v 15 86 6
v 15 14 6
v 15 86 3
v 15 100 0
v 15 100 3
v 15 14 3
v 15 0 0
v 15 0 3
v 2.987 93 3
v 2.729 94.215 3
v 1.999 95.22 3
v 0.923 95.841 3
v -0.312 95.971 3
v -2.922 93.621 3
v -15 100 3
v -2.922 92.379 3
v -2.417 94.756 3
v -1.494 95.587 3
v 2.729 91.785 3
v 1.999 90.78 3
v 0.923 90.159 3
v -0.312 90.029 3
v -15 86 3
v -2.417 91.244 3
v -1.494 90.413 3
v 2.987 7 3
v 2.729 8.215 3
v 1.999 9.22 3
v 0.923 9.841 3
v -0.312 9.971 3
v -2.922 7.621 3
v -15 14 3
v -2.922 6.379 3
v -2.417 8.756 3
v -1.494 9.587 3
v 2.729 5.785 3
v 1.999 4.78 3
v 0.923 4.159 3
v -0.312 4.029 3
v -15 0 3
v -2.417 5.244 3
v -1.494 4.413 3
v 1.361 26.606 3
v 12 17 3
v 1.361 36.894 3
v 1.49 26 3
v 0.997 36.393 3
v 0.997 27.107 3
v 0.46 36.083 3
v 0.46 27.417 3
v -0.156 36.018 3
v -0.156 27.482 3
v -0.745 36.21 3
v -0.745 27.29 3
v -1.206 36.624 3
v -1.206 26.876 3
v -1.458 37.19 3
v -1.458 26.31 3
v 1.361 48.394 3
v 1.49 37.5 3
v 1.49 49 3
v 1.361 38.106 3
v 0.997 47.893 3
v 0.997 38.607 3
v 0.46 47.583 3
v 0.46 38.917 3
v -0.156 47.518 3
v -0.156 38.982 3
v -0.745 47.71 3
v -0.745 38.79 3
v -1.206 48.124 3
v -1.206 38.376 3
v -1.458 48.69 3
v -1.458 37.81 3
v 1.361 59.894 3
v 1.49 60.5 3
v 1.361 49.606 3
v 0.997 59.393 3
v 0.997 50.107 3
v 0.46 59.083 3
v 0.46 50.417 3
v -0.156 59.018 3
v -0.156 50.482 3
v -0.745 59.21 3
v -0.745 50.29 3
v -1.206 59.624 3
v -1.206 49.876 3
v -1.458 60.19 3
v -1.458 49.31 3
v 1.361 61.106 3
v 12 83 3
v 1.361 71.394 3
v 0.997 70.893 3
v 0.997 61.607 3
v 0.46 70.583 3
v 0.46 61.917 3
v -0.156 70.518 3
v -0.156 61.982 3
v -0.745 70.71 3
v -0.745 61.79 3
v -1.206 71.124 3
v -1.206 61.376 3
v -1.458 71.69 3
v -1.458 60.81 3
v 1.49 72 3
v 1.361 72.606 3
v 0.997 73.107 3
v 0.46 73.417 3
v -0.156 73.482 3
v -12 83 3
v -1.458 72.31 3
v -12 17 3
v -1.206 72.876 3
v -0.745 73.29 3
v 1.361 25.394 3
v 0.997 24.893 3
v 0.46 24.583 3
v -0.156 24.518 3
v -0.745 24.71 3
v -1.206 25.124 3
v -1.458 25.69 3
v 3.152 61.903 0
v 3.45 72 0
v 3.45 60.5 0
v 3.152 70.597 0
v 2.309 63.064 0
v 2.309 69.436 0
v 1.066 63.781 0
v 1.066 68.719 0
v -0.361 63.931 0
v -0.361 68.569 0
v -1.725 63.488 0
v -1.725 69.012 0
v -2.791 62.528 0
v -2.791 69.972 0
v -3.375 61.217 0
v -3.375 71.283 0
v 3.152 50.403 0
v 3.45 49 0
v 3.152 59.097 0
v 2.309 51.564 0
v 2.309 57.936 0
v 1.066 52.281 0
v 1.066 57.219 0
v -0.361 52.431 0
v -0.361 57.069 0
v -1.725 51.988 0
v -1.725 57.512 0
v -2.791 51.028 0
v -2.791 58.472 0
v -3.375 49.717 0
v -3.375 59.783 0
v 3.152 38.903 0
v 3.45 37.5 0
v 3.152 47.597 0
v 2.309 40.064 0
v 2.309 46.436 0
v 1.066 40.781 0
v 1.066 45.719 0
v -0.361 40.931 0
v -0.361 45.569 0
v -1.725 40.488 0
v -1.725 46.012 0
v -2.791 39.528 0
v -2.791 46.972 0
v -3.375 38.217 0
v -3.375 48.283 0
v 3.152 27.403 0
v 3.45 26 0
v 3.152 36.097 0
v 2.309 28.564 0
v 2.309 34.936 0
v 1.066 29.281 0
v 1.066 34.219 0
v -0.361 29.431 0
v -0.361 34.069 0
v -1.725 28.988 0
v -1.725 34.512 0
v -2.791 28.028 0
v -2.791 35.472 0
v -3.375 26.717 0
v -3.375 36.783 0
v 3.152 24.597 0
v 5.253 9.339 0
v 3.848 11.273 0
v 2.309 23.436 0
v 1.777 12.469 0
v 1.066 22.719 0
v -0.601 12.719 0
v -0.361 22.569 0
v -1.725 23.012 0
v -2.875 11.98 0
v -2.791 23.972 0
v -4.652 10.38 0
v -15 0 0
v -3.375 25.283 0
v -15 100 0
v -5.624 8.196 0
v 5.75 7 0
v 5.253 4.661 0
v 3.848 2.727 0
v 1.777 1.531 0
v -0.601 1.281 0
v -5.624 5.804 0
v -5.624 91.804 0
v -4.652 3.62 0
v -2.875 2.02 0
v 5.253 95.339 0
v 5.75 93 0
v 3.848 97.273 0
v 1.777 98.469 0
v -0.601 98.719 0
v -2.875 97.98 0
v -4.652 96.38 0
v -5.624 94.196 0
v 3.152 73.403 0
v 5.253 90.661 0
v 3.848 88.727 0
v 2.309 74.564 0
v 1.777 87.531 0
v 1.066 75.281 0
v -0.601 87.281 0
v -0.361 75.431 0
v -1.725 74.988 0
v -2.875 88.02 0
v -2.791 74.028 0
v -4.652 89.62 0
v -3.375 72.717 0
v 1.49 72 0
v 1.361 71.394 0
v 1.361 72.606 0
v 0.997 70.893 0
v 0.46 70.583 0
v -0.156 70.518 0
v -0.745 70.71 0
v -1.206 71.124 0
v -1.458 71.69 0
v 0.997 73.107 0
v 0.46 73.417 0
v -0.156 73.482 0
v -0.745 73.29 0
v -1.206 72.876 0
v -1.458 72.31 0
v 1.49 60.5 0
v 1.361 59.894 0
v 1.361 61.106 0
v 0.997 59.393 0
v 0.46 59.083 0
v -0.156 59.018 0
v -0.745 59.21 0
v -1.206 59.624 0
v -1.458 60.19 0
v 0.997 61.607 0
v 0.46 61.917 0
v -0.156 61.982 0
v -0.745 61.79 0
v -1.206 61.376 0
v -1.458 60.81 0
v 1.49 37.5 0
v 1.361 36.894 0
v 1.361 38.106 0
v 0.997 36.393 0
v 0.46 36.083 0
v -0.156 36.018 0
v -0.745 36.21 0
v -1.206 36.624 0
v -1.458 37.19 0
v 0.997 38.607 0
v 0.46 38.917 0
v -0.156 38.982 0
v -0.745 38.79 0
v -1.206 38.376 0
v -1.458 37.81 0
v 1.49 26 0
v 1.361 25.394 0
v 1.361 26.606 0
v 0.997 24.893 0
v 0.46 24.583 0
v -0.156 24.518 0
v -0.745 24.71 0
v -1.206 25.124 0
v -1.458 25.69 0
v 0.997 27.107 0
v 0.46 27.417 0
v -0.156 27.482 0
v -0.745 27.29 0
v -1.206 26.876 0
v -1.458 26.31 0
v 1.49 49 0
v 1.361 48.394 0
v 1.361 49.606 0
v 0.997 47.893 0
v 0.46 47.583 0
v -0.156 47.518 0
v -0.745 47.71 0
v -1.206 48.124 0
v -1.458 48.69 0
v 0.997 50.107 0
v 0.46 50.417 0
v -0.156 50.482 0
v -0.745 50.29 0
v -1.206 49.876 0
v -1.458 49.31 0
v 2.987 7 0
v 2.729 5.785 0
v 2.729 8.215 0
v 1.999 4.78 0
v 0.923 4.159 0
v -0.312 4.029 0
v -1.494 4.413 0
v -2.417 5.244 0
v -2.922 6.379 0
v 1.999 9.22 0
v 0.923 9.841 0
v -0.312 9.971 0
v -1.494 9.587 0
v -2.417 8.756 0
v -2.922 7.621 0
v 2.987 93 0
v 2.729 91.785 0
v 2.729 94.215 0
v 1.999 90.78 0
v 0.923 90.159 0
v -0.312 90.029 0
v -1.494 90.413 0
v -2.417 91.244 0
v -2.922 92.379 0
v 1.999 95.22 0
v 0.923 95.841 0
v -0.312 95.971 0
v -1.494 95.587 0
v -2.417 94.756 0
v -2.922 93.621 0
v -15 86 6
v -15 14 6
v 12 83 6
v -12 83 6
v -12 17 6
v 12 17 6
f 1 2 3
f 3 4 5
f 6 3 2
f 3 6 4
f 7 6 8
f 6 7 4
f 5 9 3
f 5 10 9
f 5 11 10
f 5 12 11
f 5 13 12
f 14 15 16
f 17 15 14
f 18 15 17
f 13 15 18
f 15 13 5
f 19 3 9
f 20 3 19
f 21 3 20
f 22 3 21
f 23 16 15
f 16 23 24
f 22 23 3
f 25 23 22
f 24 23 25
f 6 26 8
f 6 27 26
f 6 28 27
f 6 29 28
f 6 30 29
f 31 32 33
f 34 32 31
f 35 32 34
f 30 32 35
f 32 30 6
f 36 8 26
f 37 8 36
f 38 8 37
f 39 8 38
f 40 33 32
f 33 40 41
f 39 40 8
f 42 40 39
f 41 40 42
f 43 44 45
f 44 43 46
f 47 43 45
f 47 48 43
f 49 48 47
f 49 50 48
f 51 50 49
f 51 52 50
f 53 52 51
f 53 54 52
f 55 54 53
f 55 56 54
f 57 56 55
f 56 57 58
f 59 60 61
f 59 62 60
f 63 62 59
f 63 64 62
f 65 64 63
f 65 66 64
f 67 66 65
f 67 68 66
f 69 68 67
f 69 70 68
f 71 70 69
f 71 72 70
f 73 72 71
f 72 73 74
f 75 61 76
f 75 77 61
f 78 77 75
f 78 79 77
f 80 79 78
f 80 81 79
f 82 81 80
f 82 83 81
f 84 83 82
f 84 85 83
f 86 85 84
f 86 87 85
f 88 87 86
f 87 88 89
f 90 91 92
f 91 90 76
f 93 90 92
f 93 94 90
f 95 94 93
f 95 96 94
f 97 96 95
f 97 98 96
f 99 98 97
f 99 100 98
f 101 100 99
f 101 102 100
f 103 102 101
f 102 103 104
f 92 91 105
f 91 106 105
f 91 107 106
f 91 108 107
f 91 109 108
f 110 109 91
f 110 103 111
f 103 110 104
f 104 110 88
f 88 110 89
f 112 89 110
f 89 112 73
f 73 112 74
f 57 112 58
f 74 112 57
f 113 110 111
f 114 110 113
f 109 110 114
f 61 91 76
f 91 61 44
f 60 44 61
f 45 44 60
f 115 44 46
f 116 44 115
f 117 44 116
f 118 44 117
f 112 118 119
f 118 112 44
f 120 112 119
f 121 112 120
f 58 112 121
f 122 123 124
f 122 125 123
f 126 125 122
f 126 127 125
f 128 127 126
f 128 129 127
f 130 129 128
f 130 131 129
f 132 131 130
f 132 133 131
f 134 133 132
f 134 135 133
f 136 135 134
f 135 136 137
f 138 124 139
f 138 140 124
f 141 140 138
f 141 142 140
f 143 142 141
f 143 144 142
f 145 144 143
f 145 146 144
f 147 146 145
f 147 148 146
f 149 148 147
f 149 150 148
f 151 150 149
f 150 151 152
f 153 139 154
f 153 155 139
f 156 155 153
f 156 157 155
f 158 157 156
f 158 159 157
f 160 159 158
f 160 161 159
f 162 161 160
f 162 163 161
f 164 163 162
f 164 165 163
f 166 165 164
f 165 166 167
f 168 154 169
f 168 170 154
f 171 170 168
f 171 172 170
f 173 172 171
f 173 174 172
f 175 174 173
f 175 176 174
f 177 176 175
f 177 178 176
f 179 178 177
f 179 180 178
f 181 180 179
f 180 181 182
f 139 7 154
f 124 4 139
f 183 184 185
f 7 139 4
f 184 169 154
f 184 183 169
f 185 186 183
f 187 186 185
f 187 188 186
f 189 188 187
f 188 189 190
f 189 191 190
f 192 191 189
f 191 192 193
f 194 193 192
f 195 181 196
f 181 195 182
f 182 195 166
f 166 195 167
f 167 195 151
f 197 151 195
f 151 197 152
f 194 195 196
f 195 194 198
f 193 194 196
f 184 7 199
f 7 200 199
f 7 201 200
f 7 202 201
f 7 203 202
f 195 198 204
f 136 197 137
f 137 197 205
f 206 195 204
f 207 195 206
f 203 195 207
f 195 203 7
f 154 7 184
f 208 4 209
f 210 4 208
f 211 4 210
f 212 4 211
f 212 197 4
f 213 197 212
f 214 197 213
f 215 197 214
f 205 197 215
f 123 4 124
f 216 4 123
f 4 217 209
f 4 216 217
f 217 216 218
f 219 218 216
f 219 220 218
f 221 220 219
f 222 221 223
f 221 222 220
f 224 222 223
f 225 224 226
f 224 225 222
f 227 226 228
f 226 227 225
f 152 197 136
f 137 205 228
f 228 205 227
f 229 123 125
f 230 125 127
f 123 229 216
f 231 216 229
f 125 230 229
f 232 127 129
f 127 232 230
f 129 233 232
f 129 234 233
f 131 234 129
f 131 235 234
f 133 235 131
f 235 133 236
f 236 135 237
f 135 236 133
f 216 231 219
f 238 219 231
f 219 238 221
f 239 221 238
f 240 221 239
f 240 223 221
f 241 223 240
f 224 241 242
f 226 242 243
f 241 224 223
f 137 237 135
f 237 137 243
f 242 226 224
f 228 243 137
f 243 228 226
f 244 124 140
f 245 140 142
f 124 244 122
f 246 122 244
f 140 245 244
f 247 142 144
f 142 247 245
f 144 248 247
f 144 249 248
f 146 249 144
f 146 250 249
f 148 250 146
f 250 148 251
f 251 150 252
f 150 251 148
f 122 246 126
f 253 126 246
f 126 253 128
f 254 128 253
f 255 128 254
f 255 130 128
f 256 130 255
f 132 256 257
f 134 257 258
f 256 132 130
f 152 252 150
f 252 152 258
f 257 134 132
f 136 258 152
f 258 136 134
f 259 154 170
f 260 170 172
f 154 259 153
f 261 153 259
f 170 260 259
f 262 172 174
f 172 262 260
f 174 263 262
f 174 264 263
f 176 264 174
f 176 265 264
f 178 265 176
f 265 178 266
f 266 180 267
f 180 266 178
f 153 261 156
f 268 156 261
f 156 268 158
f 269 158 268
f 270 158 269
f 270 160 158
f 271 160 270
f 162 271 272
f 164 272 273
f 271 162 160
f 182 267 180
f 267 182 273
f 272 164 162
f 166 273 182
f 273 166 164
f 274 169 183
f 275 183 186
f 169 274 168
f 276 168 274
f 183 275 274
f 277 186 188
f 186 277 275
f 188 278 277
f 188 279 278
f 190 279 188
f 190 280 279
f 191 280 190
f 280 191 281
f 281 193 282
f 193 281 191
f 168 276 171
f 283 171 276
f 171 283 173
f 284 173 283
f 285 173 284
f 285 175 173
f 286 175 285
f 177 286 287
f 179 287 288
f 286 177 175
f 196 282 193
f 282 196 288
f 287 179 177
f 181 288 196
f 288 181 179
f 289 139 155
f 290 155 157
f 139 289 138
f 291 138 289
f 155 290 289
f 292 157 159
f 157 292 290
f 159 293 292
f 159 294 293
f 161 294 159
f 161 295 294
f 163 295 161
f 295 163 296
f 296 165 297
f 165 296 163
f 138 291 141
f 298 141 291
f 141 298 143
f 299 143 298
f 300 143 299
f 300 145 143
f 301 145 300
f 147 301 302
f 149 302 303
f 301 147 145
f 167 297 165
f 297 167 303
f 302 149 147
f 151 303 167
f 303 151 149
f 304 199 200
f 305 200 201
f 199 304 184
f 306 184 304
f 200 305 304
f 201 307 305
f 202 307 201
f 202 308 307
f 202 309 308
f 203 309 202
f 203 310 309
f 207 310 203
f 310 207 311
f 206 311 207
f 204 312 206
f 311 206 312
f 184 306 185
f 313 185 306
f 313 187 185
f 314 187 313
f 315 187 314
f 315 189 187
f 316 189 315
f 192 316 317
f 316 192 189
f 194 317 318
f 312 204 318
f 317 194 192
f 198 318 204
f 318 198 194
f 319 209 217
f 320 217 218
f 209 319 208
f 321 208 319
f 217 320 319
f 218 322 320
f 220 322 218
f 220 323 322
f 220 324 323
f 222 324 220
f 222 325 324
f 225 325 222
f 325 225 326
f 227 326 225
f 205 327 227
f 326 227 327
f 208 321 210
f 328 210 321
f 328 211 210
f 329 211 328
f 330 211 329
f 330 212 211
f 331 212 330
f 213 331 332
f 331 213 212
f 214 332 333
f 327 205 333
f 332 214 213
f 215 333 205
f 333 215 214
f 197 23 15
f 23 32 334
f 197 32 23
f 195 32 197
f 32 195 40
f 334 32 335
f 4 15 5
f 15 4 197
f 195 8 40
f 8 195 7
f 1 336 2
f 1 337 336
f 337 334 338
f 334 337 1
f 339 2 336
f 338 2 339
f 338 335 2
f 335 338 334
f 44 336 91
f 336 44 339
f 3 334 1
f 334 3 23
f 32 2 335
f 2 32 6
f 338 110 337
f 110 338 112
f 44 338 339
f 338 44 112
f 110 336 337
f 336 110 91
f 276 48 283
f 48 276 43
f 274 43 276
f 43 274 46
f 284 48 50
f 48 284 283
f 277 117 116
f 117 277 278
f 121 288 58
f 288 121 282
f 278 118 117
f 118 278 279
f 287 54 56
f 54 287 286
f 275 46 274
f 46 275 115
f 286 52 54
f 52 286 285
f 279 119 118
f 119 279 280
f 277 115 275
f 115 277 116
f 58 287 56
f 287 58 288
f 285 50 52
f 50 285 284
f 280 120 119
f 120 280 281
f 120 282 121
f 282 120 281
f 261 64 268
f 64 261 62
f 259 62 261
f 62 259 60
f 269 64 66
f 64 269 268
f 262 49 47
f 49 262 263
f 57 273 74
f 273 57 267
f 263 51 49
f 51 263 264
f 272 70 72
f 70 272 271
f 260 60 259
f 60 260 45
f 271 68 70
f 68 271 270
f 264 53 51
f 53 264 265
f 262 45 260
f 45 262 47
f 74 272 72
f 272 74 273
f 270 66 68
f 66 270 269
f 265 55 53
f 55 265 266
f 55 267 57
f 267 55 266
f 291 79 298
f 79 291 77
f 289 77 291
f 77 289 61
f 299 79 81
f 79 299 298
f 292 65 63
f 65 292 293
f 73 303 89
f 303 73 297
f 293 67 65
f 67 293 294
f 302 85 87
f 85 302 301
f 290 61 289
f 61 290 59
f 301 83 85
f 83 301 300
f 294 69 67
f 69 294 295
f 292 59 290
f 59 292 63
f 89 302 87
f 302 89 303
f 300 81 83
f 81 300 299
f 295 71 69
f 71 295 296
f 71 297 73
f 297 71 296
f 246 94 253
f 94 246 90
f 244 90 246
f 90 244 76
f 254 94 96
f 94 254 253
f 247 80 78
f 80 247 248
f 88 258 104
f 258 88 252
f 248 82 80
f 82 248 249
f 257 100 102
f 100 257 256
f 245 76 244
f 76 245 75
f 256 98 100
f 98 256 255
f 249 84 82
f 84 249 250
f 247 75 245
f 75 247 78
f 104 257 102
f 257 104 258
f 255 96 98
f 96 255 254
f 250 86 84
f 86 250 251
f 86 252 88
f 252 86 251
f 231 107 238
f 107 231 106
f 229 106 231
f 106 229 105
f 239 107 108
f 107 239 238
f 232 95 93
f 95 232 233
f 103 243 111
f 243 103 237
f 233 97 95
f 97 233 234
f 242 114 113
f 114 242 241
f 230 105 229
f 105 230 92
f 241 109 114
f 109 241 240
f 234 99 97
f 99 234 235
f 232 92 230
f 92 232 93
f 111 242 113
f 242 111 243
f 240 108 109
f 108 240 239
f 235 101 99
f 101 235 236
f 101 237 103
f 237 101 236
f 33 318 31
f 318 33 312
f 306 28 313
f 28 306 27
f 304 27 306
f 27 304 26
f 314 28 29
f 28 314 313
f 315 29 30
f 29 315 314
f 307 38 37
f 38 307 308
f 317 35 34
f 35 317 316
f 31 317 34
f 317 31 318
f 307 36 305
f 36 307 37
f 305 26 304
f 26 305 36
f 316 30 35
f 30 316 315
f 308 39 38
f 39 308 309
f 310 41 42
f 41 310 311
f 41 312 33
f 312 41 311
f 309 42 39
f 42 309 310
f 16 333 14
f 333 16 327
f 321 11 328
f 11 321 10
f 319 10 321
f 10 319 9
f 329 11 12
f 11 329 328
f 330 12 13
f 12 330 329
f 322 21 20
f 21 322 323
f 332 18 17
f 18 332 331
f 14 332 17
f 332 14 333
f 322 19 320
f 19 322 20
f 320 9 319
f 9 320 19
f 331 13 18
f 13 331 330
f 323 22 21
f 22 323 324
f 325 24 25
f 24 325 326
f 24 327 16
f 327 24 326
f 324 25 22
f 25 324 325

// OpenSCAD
// file: nuts_and_bolts.scad
// Copyright 2010 D1plo1d

// This library is dual licensed under the GPL 3.0 and the GNU Lesser General Public License as per http://creativecommons.org/licenses/LGPL/2.1/ .

//testNutsAndBolts();

module SKIPtestNutsAndBolts()
{
	$fn = 360;
	translate([0,15])nutHole(3);
	boltHole(3, length= 30);
}

MM = "mm";
INCH = "inch"; //Not yet supported

//Based on: http://www.roymech.co.uk/Useful_Tables/Screws/Hex_Screws.htm
METRIC_NUT_AC_WIDTHS =
[
	-1, //0 index is not used but reduces computation
	-1,
	-1,
	6.90,//m3
	8.10,//m4
	9.20,//m5
	11.50,//m6
	-1,
	15.50,//m8
	-1,
	19.60,//m10
	-1,
	22.10,//m12
	-1,
	-1,
	-1,
	27.70,//m16
	-1,
	-1,
	-1,
	34.60,//m20
	-1,
	-1,
	-1,
	41.60,//m24
	-1,
	-1,
	-1,
	-1,
	-1,
	53.1,//m30
	-1,
	-1,
	-1,
	-1,
	-1,
	63.5//m36
];
METRIC_NUT_THICKNESS =
[
	-1, //0 index is not used but reduces computation
	-1,
	-1,
	2.40,//m3
	3.20,//m4
	4.00,//m5
	5.00,//m6
	-1,
	6.50,//m8
	-1,
	8.00,//m10
	-1,
	10.00,//m12
	-1,
	-1,
	-1,
	13.00,//m16
	-1,
	-1,
	-1,
	16.00//m20
	-1,
	-1,
	-1,
	19.00,//m24
	-1,
	-1,
	-1,
	-1,
	-1,
	24.00,//m30
	-1,
	-1,
	-1,
	-1,
	-1,
	29.00//m36
];

COURSE_METRIC_BOLT_MAJOR_THREAD_DIAMETERS =
[//based on max values
	-1, //0 index is not used but reduces computation
	-1,
	-1,
	2.98,//m3
	3.978,//m4
	4.976,//m5
	5.974,//m6
	-1,
	7.972,//m8
	-1,
	9.968,//m10
	-1,
	11.966,//m12
	-1,
	-1,
	-1,
	15.962,//m16
	-1,
	-1,
	-1,
	19.958,//m20
	-1,
	-1,
	-1,
	23.952,//m24
	-1,
	-1,
	-1,
	-1,
	-1,
	29.947,//m30
	-1,
	-1,
	-1,
	-1,
	-1,
	35.940//m36
];

module nutHole(size, units=MM, tolerance = +0.0001, proj = -1)
{
	//takes a metric screw/nut size and looksup nut dimensions
	radius = METRIC_NUT_AC_WIDTHS[size]/2+tolerance;
	height = METRIC_NUT_THICKNESS[size]+tolerance;
	if (proj == -1)
	{
		cylinder(r= radius, h=height, $fn = 6, center=[0,0]);
	}
	if (proj == 1)
	{
		circle(r= radius, $fn = 6);
	}
	if (proj == 2)
	{
		translate([-radius/2, 0])
			square([radius*2, height]);
	}
}

module boltHole(size, units=MM, length, tolerance = +0.0001, proj = -1)
{
	radius = COURSE_METRIC_BOLT_MAJOR_THREAD_DIAMETERS[size]/2+tolerance;
//TODO: proper screw cap values
	capHeight = METRIC_NUT_THICKNESS[size]+tolerance; //METRIC_BOLT_CAP_HEIGHTS[size]+tolerance;
	capRadius = METRIC_NUT_AC_WIDTHS[size]/2+tolerance; //METRIC_BOLT_CAP_RADIUS[size]+tolerance;

	if (proj == -1)
	{
	translate([0, 0, -capHeight])
		cylinder(r= capRadius, h=capHeight, $fn=15);
	cylinder(r = radius, h = length, $fn=15);
	}
	if (proj == 1)
	{
		circle(r = radius);
	}
	if (proj == 2)
	{
		translate([-capRadius/2, -capHeight])
			square([capRadius*2, capHeight]);
		square([radius*2, length]);
	}
}

module boltHoleEx(size, units=MM, length, tolerance = +0.0001, shift_x=0, shift_y=0)
{
	radius = COURSE_METRIC_BOLT_MAJOR_THREAD_DIAMETERS[size]/2+tolerance;
//TODO: proper screw cap values
	capHeight = METRIC_NUT_THICKNESS[size]+tolerance; //METRIC_BOLT_CAP_HEIGHTS[size]+tolerance;
	capRadius = METRIC_NUT_AC_WIDTHS[size]/2+tolerance; //METRIC_BOLT_CAP_RADIUS[size]+tolerance;

	hull()
	{
		translate([0, 0, -capHeight]) cylinder(r= capRadius, h=capHeight, $fn=15);
		translate([shift_x, shift_y, -capHeight]) cylinder(r= capRadius, h=capHeight, $fn=15);
	}

	hull()
	{
		cylinder(r = radius, h = length, $fn=15);
		translate([shift_x, shift_y, 0]) cylinder(r = radius, h = length, $fn=15);
	}
}

//boltHoleEx(3, length=6);
// main file
include <nuts_and_bolts.scad>;
include <generals.scad>;

strip_length = 66+2*thin_wall;
strip_height = max(24, alu_x)+2*thin_wall;
holder_margin = 14;
hole_offset = 9;
hole_spacing = 46/4;

module connector_strip_holder()
{
	difference()
	{
		union()
		{
			translate([-strip_height/2, 0, 0]) cube([strip_height, 2*holder_margin + strip_length, thin_wall]);

			translate([strip_height/2-thin_wall, holder_margin, 0])
			cube([thin_wall, strip_length, 2*thin_wall]);

			translate([-strip_height/2, holder_margin, 0])
			cube([thin_wall, strip_length, 2*thin_wall]);

			translate([-strip_height/2, holder_margin, 0])
			cube([strip_height, thin_wall, 2*thin_wall]);

			translate([-strip_height/2, strip_length + holder_margin - thin_wall, 0])
			cube([strip_height, thin_wall, 2*thin_wall]);
		}

		for(i=[0:4])
			translate([0, holder_margin + hole_offset + thin_wall + i*hole_spacing, 0]) boltHole(3, length=10);

		translate([0, holder_margin/2, 0]) boltHole(6, length=10);
		translate([0, holder_margin*3/2+strip_length, 0]) boltHole(6, length=10);
	}
}

connector_strip_holder();
